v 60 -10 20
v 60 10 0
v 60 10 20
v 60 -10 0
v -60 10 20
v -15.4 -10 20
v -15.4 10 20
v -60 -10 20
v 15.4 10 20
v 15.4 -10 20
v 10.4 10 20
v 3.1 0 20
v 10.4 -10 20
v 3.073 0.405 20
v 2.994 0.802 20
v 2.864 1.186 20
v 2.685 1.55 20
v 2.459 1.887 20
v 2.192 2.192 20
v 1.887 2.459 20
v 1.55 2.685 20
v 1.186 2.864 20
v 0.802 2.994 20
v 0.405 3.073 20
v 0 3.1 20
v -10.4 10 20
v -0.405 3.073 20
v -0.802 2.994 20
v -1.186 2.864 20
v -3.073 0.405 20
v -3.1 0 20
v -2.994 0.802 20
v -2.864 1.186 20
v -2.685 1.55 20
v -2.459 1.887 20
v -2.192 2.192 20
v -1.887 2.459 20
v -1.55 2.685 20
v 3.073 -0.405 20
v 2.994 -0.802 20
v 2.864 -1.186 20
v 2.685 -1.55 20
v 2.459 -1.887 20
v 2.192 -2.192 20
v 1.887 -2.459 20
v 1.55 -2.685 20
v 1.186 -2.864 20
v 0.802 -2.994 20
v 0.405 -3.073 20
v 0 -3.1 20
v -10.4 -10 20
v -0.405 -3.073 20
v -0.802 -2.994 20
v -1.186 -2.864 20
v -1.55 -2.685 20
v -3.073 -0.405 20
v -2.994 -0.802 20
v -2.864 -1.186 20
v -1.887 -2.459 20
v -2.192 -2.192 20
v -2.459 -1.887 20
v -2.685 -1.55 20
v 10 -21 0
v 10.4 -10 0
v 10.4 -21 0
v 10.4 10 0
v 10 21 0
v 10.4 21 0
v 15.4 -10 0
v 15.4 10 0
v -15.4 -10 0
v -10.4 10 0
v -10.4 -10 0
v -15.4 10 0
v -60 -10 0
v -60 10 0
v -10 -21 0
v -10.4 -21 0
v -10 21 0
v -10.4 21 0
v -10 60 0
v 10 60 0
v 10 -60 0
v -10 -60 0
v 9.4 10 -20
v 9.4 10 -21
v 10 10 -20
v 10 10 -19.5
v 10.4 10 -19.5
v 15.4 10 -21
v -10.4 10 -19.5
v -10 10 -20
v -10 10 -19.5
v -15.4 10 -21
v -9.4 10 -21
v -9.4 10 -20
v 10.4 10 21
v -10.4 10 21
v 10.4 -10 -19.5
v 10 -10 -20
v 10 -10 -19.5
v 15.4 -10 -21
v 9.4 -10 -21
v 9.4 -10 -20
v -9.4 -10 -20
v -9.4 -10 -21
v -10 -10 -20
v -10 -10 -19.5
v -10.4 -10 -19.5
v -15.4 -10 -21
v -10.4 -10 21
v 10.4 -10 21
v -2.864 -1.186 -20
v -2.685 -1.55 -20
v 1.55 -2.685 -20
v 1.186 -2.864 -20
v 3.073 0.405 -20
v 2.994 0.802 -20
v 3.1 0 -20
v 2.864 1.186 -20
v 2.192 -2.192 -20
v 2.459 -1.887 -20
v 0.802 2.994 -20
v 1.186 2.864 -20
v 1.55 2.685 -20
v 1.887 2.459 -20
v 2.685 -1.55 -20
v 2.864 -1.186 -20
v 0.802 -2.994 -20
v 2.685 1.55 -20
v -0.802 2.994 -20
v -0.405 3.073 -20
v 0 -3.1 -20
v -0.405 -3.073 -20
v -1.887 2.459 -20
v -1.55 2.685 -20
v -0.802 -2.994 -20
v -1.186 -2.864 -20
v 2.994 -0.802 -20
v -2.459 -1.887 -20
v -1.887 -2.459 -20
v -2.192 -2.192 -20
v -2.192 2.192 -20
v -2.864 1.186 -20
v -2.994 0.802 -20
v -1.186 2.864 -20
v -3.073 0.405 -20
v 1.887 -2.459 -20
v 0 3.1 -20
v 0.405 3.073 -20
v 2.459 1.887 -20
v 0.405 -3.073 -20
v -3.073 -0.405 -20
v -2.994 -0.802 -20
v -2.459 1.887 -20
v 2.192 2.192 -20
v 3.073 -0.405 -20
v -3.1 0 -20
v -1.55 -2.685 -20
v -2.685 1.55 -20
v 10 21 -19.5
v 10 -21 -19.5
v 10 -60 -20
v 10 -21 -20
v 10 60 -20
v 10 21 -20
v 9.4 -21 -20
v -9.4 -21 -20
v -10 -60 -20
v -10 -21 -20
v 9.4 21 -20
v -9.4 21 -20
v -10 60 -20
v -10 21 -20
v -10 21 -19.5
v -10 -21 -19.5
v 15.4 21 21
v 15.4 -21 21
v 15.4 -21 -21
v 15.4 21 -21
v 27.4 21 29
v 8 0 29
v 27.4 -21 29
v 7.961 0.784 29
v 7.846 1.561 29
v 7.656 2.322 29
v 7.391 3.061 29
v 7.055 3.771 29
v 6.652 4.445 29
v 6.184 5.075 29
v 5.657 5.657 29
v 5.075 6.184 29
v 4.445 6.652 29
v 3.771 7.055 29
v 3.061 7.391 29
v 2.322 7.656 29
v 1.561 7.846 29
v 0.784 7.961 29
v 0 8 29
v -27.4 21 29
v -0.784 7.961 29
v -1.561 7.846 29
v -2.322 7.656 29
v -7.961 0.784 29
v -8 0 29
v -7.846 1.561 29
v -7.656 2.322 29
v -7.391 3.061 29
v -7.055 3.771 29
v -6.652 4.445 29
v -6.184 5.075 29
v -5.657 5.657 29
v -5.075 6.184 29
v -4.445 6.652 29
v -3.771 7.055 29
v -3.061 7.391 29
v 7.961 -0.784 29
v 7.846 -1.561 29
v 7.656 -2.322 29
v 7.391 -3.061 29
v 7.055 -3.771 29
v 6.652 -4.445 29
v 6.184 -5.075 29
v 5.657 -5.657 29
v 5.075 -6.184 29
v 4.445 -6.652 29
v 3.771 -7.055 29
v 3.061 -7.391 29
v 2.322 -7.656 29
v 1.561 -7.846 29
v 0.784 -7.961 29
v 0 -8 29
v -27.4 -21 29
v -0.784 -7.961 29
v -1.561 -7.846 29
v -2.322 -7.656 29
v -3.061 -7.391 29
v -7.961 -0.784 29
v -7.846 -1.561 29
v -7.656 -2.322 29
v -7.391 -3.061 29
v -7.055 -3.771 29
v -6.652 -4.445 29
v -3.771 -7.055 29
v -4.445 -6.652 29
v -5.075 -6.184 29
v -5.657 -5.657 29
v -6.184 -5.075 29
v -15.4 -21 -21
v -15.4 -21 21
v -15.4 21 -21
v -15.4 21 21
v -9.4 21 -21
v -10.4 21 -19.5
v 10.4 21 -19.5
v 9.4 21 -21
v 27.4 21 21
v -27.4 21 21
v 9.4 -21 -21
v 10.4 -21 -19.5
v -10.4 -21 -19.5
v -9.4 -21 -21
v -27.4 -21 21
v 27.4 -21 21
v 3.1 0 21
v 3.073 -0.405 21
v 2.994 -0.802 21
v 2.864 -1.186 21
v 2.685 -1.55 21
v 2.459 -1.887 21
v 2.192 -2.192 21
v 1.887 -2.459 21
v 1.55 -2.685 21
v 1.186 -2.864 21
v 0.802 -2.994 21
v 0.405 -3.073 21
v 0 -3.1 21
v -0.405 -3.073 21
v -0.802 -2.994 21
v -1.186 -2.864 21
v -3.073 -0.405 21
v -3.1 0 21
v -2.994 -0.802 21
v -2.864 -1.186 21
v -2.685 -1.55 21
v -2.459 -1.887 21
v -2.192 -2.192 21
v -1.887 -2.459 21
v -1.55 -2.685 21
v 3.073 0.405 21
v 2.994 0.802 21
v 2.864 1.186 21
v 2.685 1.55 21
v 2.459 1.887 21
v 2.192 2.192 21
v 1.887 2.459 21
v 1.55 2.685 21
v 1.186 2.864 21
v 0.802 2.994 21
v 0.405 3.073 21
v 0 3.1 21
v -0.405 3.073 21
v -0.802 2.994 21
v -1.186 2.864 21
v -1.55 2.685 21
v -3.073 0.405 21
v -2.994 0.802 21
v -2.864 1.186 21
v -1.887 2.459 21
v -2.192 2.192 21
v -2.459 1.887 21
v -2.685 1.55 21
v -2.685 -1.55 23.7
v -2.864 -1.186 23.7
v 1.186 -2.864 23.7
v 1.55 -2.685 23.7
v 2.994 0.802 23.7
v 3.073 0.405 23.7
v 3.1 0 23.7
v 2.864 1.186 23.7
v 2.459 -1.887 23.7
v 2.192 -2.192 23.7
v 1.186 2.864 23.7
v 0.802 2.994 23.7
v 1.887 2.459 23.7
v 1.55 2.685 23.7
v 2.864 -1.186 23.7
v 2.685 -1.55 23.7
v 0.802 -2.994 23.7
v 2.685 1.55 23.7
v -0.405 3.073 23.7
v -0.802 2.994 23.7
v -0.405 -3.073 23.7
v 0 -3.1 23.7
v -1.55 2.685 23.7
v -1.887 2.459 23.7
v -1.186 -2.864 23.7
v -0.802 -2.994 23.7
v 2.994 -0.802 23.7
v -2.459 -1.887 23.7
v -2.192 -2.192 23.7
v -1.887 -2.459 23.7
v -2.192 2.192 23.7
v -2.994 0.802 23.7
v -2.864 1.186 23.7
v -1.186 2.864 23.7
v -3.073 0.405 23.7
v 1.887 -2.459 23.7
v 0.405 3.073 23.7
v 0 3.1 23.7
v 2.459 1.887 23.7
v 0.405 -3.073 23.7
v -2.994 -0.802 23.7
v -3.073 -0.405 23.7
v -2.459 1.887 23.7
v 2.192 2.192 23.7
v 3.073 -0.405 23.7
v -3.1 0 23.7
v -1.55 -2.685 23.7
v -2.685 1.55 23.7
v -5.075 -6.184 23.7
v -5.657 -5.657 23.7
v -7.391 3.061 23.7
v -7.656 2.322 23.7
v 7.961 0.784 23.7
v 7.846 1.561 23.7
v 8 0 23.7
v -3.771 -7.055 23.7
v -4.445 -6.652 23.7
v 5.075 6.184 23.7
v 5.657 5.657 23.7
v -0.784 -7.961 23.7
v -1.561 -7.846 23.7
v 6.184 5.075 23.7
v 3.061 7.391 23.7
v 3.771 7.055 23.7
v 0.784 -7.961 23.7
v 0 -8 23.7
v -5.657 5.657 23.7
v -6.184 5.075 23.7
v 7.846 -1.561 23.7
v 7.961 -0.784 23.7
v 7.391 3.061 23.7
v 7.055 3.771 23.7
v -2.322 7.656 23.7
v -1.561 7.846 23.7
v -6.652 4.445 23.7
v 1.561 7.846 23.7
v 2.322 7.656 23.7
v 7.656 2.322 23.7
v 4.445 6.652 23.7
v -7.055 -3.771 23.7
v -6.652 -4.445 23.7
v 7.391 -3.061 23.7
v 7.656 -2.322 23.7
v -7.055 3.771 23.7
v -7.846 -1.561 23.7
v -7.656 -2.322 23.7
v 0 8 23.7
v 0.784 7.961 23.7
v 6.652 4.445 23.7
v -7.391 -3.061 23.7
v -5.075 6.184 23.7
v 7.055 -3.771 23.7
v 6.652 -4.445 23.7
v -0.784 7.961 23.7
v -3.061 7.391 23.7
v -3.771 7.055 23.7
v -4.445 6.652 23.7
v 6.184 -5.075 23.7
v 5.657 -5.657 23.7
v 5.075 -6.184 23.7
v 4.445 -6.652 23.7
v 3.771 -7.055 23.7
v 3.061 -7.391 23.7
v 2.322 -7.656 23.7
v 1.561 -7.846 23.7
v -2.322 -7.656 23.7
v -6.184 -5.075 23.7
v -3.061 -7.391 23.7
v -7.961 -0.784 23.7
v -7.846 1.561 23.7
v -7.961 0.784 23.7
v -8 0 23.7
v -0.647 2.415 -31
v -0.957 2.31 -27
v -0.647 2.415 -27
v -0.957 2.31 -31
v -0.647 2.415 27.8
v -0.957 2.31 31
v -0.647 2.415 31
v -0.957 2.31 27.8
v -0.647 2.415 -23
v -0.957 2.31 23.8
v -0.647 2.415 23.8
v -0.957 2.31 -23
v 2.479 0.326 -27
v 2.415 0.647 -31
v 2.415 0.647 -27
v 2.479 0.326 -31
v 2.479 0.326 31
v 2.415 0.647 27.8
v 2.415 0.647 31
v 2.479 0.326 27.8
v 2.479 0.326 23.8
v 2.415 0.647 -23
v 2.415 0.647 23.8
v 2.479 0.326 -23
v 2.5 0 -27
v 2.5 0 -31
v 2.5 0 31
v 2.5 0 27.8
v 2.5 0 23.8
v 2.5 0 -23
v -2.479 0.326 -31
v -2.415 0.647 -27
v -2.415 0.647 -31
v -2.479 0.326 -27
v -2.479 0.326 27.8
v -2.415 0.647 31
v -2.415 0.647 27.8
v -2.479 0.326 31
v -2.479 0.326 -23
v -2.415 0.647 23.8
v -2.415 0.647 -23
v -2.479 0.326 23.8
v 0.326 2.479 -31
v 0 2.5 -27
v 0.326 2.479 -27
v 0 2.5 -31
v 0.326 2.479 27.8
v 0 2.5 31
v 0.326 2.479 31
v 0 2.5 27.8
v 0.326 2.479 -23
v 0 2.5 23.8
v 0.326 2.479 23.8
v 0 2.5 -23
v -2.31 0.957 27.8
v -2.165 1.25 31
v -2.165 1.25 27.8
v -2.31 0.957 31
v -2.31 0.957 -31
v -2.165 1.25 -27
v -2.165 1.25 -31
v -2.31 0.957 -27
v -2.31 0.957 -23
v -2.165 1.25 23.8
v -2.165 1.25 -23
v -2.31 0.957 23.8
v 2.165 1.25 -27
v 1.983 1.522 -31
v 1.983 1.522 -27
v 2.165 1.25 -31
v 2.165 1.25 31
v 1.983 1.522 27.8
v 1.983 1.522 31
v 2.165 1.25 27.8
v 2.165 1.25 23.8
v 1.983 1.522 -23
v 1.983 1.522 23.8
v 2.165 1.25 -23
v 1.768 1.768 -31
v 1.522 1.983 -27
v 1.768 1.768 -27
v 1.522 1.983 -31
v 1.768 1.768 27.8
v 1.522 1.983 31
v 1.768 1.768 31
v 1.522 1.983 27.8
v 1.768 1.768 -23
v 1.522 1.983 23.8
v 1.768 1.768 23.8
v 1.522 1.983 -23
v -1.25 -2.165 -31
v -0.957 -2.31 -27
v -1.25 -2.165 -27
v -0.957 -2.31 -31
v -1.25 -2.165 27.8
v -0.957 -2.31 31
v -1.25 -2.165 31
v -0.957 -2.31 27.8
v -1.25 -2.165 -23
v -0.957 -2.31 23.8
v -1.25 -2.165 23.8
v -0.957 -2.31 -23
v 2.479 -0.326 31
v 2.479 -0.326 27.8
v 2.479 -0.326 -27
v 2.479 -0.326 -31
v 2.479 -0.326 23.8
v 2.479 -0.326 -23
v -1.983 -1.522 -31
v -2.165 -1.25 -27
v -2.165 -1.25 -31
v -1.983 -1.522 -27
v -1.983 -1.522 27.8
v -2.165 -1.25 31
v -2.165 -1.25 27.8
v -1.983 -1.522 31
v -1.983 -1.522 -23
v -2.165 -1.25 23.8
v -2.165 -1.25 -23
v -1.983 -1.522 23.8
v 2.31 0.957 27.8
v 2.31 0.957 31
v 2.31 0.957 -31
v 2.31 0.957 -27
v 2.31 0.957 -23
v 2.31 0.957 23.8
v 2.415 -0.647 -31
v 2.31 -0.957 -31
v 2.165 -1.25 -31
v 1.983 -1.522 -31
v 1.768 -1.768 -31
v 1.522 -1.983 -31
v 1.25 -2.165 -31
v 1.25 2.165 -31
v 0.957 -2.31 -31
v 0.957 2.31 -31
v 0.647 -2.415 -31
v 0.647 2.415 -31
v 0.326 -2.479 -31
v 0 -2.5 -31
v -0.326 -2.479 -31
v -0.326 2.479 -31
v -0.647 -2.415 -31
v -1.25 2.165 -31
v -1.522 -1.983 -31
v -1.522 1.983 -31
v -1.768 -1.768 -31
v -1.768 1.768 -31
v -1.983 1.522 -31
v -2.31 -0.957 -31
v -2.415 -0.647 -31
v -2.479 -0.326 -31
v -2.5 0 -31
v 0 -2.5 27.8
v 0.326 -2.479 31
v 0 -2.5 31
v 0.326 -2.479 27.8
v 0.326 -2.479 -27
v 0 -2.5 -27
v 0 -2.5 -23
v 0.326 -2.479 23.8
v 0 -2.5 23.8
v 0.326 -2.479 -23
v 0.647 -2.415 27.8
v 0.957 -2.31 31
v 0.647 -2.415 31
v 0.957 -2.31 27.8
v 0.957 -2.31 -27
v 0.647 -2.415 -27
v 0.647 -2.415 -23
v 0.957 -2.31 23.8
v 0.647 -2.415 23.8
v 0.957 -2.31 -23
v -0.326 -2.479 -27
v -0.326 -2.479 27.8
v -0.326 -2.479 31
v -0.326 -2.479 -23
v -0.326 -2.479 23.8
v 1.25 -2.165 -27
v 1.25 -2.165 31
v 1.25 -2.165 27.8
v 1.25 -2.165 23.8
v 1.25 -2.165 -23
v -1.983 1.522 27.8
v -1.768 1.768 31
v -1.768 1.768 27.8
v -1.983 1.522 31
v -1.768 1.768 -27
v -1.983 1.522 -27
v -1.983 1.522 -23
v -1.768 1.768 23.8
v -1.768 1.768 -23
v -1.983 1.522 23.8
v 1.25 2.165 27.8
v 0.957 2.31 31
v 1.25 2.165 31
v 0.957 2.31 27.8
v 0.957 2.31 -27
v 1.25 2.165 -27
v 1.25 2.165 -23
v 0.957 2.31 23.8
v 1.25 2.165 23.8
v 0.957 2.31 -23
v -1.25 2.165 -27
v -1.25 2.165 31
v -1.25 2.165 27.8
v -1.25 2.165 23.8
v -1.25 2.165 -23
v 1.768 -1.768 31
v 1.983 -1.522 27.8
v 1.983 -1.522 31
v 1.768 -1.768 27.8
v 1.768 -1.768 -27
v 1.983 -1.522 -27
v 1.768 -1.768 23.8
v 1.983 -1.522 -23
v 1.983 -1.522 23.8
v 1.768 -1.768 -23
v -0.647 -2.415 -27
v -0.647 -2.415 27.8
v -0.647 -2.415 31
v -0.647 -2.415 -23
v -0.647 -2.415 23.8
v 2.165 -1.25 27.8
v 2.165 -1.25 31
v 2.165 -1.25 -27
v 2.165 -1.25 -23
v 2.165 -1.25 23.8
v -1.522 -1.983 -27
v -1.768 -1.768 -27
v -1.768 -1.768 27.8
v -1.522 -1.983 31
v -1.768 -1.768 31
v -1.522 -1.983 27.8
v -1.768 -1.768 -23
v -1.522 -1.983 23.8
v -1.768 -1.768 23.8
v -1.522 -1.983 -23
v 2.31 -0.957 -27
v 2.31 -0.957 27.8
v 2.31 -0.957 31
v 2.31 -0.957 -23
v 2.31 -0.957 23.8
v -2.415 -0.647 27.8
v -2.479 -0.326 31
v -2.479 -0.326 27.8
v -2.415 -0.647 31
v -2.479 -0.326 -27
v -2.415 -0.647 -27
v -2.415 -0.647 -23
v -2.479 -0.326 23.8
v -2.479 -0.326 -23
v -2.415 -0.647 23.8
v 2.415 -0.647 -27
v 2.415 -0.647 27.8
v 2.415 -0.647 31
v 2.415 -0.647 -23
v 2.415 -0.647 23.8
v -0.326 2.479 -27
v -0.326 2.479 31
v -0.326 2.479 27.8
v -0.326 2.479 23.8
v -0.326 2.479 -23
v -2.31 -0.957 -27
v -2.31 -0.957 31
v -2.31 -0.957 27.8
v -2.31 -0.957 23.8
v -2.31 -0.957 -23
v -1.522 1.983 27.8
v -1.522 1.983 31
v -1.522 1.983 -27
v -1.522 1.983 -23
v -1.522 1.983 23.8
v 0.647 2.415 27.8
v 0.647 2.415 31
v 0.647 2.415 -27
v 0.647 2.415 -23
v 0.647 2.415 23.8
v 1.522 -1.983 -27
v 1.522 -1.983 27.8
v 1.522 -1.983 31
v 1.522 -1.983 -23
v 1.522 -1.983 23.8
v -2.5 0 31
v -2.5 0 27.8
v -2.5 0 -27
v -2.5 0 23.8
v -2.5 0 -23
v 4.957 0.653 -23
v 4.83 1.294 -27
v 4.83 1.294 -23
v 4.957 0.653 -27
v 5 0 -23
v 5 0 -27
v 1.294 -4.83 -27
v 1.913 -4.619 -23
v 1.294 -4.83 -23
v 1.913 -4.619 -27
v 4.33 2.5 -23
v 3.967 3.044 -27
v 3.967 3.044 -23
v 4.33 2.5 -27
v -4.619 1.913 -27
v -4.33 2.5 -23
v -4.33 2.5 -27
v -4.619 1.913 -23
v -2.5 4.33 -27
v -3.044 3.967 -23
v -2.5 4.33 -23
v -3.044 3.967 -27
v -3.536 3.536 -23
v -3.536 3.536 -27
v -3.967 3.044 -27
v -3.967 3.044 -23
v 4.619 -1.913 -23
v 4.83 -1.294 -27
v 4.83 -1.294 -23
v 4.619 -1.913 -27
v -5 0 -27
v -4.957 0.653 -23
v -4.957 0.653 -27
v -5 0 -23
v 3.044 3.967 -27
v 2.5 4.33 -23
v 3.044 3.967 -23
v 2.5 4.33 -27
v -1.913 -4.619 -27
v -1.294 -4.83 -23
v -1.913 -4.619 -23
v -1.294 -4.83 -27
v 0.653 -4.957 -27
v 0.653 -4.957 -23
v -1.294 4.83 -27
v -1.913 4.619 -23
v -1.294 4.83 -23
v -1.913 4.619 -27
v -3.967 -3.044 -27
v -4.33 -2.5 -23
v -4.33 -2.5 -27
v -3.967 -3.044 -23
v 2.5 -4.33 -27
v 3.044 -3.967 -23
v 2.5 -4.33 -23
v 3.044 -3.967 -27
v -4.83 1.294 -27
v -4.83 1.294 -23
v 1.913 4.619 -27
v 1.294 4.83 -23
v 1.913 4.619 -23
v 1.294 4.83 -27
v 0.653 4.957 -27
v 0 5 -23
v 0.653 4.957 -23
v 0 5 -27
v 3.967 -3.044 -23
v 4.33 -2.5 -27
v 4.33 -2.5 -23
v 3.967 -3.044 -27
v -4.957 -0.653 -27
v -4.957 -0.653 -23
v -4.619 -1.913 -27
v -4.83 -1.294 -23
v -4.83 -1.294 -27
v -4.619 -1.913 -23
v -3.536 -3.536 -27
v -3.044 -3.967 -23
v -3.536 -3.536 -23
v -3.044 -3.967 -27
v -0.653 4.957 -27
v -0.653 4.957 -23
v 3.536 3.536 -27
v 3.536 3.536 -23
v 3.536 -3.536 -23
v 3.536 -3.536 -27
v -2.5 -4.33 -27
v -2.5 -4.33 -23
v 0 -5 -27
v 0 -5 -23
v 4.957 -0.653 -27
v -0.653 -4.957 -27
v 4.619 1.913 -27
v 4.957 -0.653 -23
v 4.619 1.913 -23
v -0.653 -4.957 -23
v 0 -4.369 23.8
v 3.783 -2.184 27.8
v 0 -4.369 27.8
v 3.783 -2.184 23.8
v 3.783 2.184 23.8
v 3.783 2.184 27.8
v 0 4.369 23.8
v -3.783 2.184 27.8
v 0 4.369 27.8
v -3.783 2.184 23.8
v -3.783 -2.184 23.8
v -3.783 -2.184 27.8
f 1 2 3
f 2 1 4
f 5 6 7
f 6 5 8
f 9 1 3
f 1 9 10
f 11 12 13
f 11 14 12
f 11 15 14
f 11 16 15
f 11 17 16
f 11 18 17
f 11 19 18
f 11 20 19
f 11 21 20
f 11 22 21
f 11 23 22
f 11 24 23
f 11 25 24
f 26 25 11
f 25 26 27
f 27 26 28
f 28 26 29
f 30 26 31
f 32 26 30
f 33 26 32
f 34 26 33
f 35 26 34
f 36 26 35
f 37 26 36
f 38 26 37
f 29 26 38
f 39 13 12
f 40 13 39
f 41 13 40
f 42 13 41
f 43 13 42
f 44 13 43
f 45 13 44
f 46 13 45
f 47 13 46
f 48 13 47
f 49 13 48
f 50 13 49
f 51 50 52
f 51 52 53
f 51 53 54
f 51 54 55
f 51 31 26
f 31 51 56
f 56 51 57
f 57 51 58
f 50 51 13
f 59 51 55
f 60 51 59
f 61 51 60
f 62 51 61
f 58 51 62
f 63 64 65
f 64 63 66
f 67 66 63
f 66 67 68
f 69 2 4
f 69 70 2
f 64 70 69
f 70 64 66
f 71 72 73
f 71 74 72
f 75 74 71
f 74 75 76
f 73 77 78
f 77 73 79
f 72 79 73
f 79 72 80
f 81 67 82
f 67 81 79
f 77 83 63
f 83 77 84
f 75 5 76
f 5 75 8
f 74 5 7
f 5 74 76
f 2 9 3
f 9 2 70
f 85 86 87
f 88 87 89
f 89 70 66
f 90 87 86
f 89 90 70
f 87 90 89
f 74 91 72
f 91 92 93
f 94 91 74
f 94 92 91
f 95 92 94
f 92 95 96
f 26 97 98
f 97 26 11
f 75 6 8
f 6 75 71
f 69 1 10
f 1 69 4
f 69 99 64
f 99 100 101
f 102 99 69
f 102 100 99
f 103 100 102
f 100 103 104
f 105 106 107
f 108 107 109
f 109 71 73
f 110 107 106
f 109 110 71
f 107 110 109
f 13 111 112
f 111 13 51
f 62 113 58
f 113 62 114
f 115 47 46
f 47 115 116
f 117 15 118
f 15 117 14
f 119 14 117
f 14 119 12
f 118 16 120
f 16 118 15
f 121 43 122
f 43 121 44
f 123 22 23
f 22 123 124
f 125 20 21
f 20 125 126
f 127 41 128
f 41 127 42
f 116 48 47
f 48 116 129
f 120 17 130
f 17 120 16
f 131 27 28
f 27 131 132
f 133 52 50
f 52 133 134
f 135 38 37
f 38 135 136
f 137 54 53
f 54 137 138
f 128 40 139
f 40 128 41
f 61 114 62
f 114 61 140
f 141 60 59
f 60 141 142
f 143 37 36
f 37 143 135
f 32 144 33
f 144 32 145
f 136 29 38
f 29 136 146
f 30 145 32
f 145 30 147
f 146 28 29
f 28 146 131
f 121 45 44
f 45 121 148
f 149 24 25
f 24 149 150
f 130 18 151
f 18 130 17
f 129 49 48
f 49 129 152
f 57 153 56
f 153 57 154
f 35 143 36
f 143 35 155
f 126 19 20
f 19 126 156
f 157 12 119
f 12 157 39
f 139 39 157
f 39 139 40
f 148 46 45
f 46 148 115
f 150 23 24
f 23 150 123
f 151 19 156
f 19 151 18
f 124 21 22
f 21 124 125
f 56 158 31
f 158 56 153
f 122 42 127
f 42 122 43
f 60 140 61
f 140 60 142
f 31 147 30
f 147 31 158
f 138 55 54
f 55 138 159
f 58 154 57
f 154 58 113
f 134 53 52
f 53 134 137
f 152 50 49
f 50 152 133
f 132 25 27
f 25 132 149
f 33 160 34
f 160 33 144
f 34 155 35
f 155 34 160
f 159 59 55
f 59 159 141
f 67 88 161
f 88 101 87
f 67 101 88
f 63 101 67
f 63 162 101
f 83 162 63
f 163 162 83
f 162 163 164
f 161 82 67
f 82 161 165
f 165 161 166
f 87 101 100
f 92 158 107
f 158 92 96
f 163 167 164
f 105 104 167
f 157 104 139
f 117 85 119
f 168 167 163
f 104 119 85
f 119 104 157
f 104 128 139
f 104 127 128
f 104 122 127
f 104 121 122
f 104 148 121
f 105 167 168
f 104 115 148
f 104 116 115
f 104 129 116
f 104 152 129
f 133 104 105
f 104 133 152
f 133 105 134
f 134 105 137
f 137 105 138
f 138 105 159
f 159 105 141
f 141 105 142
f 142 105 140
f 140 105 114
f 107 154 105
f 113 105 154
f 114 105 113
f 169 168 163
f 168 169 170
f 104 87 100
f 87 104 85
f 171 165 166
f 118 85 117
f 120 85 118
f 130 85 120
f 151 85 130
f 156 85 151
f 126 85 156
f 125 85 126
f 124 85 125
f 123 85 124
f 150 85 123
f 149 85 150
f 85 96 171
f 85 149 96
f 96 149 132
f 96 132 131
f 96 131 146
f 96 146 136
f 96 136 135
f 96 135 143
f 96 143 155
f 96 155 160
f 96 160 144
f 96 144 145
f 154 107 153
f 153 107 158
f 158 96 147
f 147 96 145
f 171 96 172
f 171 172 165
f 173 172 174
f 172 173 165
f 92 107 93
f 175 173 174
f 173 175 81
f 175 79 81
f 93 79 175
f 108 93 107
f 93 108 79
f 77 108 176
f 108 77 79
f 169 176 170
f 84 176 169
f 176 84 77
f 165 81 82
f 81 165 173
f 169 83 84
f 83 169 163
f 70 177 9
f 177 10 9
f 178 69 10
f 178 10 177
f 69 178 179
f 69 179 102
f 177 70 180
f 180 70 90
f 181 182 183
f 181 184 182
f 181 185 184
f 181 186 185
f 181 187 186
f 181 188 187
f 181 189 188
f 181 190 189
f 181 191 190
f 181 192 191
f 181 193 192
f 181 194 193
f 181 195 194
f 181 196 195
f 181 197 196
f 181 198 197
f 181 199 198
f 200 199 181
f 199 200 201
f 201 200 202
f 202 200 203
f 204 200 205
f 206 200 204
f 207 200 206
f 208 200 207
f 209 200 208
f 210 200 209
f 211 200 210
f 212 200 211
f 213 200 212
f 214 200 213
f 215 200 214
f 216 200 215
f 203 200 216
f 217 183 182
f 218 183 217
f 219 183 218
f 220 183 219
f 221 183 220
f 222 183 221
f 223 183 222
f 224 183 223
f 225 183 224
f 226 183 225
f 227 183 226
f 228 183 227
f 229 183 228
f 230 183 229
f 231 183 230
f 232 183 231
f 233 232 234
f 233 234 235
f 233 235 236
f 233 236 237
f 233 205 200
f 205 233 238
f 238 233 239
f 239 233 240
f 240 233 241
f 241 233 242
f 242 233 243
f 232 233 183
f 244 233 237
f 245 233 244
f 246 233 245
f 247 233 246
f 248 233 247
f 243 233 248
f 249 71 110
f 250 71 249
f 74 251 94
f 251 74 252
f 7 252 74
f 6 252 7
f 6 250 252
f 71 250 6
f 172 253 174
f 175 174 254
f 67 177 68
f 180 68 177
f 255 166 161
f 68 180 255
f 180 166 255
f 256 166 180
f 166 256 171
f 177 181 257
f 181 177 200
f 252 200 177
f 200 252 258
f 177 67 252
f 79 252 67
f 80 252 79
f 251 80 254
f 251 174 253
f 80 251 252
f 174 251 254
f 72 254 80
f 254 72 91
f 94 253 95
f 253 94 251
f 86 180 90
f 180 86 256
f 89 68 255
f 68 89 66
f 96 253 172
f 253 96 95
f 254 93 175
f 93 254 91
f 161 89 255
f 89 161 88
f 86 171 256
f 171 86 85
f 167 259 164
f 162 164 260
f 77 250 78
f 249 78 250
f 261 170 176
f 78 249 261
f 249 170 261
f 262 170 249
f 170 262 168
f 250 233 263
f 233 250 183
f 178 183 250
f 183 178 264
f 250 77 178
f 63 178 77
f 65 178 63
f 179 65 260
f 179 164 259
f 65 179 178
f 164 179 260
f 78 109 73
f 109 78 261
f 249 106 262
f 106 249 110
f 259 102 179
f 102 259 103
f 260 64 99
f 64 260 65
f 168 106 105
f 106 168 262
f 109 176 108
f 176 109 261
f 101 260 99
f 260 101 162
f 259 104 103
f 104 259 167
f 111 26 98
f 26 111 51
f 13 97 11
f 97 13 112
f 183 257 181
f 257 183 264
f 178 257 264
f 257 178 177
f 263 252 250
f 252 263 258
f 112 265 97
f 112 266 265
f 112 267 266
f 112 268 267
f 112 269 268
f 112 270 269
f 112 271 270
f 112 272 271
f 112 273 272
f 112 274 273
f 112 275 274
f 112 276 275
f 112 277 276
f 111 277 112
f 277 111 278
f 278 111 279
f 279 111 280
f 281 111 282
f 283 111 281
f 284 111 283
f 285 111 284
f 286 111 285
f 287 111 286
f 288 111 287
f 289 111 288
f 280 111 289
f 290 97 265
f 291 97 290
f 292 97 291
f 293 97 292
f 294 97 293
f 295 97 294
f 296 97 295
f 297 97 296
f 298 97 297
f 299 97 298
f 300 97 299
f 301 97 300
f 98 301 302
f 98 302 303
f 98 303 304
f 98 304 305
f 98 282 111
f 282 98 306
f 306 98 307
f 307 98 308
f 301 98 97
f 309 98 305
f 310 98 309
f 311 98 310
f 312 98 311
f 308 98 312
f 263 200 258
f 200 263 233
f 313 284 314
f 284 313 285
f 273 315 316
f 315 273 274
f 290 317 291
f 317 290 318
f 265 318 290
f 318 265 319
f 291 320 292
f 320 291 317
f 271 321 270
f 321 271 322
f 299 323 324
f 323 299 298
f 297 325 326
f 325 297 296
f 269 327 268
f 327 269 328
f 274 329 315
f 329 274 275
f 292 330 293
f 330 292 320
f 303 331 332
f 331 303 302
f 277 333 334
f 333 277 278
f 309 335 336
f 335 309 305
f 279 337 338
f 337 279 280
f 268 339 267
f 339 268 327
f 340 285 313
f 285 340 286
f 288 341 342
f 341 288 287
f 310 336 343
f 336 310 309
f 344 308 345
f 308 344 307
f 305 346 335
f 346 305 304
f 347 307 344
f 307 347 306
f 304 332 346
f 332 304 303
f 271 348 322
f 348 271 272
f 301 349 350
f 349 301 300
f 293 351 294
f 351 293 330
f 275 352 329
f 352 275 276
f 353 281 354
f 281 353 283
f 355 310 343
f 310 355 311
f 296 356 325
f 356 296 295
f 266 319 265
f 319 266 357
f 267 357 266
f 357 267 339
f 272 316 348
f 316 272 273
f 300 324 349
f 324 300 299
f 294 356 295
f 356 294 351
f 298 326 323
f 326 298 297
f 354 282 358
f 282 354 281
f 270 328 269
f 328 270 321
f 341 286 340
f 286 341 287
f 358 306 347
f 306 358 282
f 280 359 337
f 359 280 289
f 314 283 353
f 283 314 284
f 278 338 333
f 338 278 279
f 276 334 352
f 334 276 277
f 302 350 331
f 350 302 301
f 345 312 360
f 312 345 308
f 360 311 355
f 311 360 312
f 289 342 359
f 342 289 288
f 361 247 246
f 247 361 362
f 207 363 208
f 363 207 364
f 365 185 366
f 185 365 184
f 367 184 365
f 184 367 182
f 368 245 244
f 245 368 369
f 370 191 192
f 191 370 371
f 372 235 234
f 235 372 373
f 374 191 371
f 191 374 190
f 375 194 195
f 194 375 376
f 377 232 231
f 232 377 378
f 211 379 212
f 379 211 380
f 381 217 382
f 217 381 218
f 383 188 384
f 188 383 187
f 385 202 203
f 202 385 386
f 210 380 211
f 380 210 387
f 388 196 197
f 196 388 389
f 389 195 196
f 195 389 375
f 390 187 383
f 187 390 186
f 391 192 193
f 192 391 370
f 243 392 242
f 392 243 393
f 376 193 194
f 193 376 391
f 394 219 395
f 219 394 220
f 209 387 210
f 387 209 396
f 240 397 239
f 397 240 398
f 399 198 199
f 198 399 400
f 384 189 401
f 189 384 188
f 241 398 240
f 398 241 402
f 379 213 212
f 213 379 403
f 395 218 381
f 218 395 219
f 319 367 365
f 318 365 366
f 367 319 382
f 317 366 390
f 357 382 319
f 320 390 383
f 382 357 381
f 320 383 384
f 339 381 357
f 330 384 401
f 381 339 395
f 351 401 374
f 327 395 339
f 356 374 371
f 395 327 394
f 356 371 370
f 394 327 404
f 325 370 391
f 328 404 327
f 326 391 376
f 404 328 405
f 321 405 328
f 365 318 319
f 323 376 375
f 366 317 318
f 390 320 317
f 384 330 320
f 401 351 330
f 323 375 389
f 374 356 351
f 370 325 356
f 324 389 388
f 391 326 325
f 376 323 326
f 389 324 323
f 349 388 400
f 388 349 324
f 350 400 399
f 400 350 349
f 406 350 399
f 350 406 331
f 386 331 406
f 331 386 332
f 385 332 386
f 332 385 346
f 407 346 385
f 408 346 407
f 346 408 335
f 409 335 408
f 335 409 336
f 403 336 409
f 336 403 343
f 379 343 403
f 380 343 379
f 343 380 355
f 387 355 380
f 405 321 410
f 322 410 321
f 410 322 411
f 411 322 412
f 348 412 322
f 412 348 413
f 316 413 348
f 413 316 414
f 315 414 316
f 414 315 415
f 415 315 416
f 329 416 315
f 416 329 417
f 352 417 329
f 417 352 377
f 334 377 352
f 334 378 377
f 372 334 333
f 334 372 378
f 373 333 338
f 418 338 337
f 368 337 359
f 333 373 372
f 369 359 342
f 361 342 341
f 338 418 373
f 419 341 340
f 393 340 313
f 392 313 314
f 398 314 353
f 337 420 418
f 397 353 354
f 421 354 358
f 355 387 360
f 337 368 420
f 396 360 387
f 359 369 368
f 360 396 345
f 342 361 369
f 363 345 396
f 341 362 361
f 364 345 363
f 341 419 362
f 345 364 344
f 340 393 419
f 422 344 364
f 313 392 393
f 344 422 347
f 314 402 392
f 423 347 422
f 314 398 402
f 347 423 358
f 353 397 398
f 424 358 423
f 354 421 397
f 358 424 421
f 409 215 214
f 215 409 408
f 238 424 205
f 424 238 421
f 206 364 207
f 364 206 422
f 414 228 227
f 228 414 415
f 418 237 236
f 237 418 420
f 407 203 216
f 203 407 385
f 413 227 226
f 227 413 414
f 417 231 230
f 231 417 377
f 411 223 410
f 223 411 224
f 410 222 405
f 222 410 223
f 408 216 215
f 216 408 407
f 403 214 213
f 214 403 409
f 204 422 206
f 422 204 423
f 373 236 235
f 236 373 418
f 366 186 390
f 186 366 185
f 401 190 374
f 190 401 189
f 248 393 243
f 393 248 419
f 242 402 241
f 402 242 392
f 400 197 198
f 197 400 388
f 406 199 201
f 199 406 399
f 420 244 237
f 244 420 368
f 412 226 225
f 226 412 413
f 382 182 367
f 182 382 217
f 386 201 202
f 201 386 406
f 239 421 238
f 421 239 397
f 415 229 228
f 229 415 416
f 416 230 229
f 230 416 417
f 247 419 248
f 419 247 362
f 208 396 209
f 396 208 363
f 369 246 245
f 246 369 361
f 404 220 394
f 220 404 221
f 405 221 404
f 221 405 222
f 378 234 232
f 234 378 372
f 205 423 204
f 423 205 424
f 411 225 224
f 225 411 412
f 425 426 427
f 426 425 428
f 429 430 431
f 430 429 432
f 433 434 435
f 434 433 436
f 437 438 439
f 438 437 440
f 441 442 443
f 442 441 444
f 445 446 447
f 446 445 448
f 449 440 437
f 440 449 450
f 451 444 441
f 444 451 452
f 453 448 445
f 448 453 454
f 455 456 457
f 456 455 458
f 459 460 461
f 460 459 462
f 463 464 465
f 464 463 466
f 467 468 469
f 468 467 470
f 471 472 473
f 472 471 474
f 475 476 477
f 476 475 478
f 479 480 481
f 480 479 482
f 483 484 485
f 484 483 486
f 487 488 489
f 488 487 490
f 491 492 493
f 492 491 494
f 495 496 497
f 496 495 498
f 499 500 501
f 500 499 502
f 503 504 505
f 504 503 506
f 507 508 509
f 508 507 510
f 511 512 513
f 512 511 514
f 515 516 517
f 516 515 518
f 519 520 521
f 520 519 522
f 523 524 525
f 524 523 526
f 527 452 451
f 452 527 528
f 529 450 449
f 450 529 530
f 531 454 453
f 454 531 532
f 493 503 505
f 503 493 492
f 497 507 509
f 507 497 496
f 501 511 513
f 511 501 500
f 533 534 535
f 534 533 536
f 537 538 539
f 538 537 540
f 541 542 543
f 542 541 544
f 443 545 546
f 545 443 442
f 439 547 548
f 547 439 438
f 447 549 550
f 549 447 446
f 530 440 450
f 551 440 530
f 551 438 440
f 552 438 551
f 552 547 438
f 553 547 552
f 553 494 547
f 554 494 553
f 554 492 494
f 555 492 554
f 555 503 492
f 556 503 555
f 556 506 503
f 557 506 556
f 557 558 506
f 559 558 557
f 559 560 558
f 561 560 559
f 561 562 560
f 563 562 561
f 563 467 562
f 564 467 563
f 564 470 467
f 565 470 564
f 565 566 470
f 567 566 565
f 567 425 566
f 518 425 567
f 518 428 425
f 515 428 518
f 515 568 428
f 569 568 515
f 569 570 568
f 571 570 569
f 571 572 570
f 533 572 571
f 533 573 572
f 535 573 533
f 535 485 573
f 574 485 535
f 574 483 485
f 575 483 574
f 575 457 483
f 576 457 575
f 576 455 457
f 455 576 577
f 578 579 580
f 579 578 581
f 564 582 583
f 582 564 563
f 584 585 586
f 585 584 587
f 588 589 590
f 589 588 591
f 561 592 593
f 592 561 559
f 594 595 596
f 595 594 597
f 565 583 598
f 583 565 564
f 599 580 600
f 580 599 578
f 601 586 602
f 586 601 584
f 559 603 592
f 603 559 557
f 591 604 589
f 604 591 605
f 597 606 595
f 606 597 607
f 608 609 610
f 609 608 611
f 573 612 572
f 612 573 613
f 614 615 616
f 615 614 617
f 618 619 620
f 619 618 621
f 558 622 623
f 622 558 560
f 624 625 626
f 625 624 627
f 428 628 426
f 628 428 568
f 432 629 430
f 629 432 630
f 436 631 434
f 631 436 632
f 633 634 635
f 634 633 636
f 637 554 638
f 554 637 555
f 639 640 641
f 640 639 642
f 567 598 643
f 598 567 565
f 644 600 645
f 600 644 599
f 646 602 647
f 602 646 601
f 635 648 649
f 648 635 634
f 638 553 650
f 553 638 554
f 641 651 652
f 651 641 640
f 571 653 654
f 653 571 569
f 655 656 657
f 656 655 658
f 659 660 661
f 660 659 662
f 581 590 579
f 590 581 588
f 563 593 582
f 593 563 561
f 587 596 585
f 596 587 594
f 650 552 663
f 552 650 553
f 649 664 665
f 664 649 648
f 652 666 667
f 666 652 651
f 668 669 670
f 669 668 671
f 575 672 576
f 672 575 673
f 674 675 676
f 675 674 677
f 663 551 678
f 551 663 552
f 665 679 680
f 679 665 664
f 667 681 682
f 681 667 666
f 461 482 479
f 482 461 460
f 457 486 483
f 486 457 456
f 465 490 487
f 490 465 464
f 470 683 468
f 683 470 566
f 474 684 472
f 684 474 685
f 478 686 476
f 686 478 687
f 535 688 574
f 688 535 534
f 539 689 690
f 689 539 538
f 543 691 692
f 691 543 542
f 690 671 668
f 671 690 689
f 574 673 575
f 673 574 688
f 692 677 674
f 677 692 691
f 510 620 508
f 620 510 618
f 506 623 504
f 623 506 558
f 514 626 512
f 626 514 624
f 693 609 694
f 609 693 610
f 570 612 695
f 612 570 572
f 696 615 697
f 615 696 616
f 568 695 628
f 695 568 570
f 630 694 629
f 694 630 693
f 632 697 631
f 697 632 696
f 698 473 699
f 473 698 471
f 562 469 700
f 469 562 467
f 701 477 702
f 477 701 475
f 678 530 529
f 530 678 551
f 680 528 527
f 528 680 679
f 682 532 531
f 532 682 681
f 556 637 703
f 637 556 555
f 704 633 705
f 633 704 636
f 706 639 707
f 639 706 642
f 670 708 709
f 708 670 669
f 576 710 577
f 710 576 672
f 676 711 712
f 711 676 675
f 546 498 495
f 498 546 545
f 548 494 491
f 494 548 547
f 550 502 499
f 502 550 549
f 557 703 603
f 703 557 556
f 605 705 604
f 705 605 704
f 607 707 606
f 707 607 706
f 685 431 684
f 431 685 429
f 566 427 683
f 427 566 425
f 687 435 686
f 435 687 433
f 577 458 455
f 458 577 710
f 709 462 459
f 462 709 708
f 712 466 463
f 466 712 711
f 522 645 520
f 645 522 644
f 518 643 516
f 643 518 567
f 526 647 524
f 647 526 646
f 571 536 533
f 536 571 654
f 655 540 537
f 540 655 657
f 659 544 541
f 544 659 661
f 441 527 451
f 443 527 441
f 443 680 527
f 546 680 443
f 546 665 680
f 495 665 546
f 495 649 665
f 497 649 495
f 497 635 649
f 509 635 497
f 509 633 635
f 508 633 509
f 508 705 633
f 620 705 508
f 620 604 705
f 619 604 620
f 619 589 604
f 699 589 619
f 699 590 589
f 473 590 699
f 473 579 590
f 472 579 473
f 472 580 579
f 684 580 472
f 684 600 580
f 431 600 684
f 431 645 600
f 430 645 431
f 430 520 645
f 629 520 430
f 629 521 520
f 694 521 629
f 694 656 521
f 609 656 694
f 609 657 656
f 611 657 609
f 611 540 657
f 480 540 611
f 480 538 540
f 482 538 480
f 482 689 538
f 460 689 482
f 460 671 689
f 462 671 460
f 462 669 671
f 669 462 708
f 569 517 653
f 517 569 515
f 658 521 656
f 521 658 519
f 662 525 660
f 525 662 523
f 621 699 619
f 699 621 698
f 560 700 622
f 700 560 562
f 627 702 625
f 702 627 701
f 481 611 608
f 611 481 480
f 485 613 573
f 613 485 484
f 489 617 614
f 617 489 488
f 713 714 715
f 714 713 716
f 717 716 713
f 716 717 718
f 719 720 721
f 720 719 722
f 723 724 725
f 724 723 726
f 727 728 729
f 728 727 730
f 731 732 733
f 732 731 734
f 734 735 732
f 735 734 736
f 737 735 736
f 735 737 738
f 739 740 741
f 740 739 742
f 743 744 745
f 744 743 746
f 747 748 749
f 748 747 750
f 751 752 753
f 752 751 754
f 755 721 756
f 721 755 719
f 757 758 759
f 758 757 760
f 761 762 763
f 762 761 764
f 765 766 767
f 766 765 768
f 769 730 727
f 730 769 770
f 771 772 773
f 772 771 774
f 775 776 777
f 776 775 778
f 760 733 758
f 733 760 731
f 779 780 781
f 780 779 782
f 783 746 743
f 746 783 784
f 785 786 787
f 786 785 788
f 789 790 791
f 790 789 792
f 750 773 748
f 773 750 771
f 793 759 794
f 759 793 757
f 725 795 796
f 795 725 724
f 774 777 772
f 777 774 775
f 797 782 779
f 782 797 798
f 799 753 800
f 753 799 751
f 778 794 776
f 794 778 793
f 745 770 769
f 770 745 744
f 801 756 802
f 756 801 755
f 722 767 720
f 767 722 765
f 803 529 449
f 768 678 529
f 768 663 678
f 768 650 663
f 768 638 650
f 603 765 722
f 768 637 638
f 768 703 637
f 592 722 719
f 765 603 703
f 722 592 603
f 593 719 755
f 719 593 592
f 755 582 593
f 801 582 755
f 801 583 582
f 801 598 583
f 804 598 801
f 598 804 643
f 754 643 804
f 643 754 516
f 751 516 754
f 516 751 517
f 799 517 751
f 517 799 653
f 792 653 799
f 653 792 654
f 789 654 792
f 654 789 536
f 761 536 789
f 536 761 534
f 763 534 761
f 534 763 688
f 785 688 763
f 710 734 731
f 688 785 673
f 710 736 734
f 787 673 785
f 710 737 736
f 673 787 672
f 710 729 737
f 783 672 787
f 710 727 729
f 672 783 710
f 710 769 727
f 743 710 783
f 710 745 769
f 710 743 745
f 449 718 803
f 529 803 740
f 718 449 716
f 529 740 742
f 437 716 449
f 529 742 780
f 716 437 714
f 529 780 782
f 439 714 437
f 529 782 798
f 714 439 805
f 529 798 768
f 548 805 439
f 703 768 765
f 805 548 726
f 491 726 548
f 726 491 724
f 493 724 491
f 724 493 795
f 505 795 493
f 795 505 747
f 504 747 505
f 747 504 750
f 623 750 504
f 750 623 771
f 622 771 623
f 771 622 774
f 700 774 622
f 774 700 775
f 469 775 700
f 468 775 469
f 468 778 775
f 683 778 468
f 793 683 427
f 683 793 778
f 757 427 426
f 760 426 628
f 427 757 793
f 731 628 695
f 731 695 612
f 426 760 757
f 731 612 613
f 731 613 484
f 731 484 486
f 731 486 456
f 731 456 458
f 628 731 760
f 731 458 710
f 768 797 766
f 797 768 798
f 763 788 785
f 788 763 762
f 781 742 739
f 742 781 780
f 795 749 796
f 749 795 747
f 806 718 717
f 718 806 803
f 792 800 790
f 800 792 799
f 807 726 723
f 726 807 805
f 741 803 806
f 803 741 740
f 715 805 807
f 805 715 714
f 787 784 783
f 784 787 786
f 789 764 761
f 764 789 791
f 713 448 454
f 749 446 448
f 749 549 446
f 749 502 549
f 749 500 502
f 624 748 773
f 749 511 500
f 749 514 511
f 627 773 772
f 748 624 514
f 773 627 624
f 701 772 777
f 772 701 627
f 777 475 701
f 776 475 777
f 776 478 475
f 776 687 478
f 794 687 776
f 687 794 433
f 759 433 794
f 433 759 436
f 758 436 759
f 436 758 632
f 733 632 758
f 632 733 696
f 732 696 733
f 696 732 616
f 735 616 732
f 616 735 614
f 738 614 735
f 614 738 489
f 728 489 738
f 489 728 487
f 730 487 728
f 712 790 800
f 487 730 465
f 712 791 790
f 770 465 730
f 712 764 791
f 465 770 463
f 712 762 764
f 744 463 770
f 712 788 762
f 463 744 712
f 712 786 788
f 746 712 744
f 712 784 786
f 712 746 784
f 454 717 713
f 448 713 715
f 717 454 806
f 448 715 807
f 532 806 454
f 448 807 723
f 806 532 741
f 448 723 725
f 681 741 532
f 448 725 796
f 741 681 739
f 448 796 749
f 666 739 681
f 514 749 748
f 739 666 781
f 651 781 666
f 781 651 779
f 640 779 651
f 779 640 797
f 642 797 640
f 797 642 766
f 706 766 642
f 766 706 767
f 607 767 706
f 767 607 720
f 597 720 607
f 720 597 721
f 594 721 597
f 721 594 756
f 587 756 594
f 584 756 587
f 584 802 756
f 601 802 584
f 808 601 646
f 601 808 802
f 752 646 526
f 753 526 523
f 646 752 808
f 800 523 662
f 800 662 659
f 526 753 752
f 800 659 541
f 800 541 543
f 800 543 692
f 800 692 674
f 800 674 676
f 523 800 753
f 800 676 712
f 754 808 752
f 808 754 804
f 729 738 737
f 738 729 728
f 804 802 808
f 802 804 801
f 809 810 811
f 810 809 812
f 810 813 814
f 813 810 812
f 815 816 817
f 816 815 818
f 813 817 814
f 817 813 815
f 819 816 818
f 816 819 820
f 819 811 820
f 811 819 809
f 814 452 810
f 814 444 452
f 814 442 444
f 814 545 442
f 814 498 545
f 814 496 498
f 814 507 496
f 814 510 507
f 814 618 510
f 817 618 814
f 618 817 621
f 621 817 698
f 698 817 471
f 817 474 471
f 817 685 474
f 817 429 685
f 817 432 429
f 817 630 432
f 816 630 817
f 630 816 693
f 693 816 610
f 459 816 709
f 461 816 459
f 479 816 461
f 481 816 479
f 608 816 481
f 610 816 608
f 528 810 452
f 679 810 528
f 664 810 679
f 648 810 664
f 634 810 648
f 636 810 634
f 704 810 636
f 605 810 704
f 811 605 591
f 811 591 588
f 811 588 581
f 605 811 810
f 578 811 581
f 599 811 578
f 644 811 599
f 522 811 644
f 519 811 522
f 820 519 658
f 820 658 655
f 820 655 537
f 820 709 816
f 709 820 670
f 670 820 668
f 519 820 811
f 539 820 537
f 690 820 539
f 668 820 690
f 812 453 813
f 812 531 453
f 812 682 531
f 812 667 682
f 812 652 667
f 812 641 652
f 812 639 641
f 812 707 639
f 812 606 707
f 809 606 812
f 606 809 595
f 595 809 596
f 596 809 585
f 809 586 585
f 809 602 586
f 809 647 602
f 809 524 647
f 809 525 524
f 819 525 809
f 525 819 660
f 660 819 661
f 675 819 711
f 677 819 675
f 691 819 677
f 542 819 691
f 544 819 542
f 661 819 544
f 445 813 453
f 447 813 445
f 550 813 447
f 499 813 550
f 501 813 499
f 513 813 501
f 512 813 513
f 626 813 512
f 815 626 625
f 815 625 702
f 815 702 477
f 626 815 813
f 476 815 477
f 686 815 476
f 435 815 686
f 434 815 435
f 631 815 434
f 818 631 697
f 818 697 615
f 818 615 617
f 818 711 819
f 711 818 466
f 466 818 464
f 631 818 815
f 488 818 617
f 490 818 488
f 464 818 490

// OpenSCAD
// Pingpang-SmartGear — one-piece double-U joint guard, v0.7
//
// Mechanical contract for this correction:
//   x = barrier long direction
//   y = front/back direction
//   z = vertical direction
//
// The printed part is ONE solid.  It contains a front U and a back U, joined
// by one printed top yoke.  The clear distance between the two U inner faces
// is exactly 20 mm.  There is no male/female printed connection and no second
// printed part to bolt together.
//
// The context tubes are the local joint envelope:
//   upper long 20x20 tube: axis x, z=0..20
//   lower perpendicular 20x20 tube: axis y, z=-20..0
// They touch at z=0 and share a vertical screw axis through their centre.

$fn = 48;

PART = "assembly_iso";

// ---------- fixed interface dimensions ----------
tube = 20;
u_inner_distance_y = 20;       // hard requirement: inner face to inner face
u_clearance_x = 0.8;           // only the x direction has initial PETG relief
u_inner_width_x = tube + u_clearance_x;
wall = 5.0;
u_outer_width_x = u_inner_width_x + 2 * wall;

front_y_inner = u_inner_distance_y / 2;
base_plate_depth_y = 7.0;
front_back_extension_y = 4.0;  // extend the complete U plate front-to-back
plate_depth_y = base_plate_depth_y + front_back_extension_y;
front_y_outer = front_y_inner + plate_depth_y;
back_y_outer = -front_y_outer;
back_y_inner = -front_y_inner;

foot_bottom_z = -tube;
below_foot_extension_z = 1.0;
u_bottom = foot_bottom_z - below_foot_extension_z;
top_yoke_bottom_z = 21.0;       // 1 mm above the upper 20x20 tube top
top_yoke_thickness = 8.0;       // reinforced top connection beam
u_top = top_yoke_bottom_z + top_yoke_thickness;
roof_eave_extension_x = 12.0;   // roof overhang on each +X/-X side
roof_width_x = u_outer_width_x + 2 * roof_eave_extension_x;
hook_depth_x = 3.5; // thinner inward wrap; keep the 8 mm vertical hold
hook_height_z = 1.5; // retain only a thin 1-2 mm vertical inward lip
solid_upper_wall_bottom_z = 0.0; // upper wall/web ends at the foot's upper edge

// Preview-only context: show the complete lower foot rather than a clipped
// 20 mm joint slice.  This does not change the printable part.
preview_foot_length_y = 120.0;

// Vertical screw relief.  This is a clearance hole, never a printed thread;
// the actual M4/M5 screw and nut/tapped tube remain external hardware.
screw_clearance_d = 6.2;

// Full top nut envelope.  Use a round pocket so a hex nut can enter in any
// rotational orientation; the clearance is intentionally generous.
nut_pocket_d = 16.0;
nut_pocket_depth = 5.2;
nut_height = 4.0;
preview_nut_af = 8.0;

assert(u_inner_distance_y == 20, "双 U 内距离必须保持 20 mm");

// ---------- helpers ----------
module box_at(xc, yc, zc, sx, sy, sz) {
    translate([xc, yc, zc]) cube([sx, sy, sz], center = true);
}

module u_plate(y0, y1) {
    depth = y1 - y0;
    yc = (y0 + y1) / 2;
    left_x = -u_outer_width_x / 2 + wall / 2;
    right_x = u_outer_width_x / 2 - wall / 2;
    lip_z = u_bottom + hook_height_z / 2;
    left_lip_x = -u_outer_width_x / 2 + wall / 2 + hook_depth_x / 2;
    right_lip_x = u_outer_width_x / 2 - wall / 2 - hook_depth_x / 2;
    union() {
        // U top and two continuous arms.
        box_at(0, yc, u_top - top_yoke_thickness / 2,
               u_outer_width_x, depth, top_yoke_thickness);
        box_at(left_x, yc, (u_top + u_bottom) / 2,
               wall, depth, u_top - u_bottom);
        box_at(right_x, yc, (u_top + u_bottom) / 2,
               wall, depth, u_top - u_bottom);

        // Solid upper web in the XZ U: fill the former open area below the
        // beam down to the top of the blue lower tube (z=0).  The web exists
        // only in the front/back U plates, so the lower foot still passes
        // through the 20 mm gap between them.
        box_at(0, yc,
               solid_upper_wall_bottom_z
                   + (u_top - solid_upper_wall_bottom_z) / 2,
               u_inner_width_x, depth,
               u_top - solid_upper_wall_bottom_z);

        // Inward lower hooks: the actual anti-rotation retaining feature.
        box_at(left_lip_x, yc, lip_z,
               hook_depth_x, depth, hook_height_z);
        box_at(right_lip_x, yc, lip_z,
               hook_depth_x, depth, hook_height_z);

    }
}

module printed_yokes() {
    // The top yoke joins the top bridges of both U plates into one roof.
    // It overhangs the U side walls by 12 mm on both sides along X.
    // The lower mouths remain open below z=0 so the front/back silhouettes
    // still retain the lower U feet and inward hooks.
    box_at(0, 0, u_top - top_yoke_thickness / 2,
           roof_width_x, 2 * front_y_outer, top_yoke_thickness);
}

module solid_upper_side_walls() {
    // Above the foot, the left and right sides are continuous solid walls
    // through the full front/back depth.  The front/back U plates also have
    // an upper web (inside u_plate) down to z=0.  The lower foot region remains
    // open except for the U arms and inward retaining hooks.
    left_x = -u_outer_width_x / 2 + wall / 2;
    right_x = u_outer_width_x / 2 - wall / 2;
    wall_height = u_top - solid_upper_wall_bottom_z;

    box_at(left_x, 0, solid_upper_wall_bottom_z + wall_height / 2,
           wall, 2 * front_y_outer, wall_height);
    box_at(right_x, 0, solid_upper_wall_bottom_z + wall_height / 2,
           wall, 2 * front_y_outer, wall_height);
}

module vertical_screw_relief() {
    // Full z-axis clearance through the printed top yoke.  There is no printed
    // material in the middle gap, so this does not create a hidden horizontal
    // tunnel or a self-intersecting connector.  The screw approaches from
    // below, passes through the two tube sections, and exits this top yoke.
    translate([0, 0, (u_bottom + u_top) / 2])
        cylinder(d = screw_clearance_d,
                 h = (u_top - u_bottom) + 8,
                 center = true);

    // Round pocket opens from the top face.  The remaining floor keeps the nut
    // captured while the round wall removes any rotational insertion constraint.
    translate([0, 0, u_top - nut_pocket_depth / 2])
        cylinder(d = nut_pocket_d,
                 h = nut_pocket_depth + 0.2,
                 center = true,
                 $fn = 64);
}

module double_u_clip() {
    difference() {
        union() {
            // Front U: inner face y=+10, outer face y=+21.
            u_plate(front_y_inner, front_y_outer);

            // Back U: inner face y=-10, outer face y=-21.
            u_plate(back_y_outer, back_y_inner);

            printed_yokes();
            solid_upper_side_walls();
        }
        vertical_screw_relief();
    }
}

// ---------- context envelope for preview only ----------
module vertical_bore() {
    translate([0, 0, 0])
        cylinder(d = screw_clearance_d, h = 60, center = true);
}

module upper_long_tube() {
    color([0.58, 0.61, 0.66])
        difference() {
            translate([0, 0, tube / 2])
                cube([120, tube, tube], center = true);
            vertical_bore();
        }
}

module lower_cross_tube() {
    // Preview the complete lower foot along y.  The printable interface still
    // uses the exact 20 mm gap between the two U inner faces.
    color([0.28, 0.45, 0.78])
        difference() {
            translate([0, 0, -tube / 2])
                cube([tube, preview_foot_length_y, tube], center = true);
            vertical_bore();
        }
}

module vertical_joint_screw() {
    color([0.82, 0.82, 0.84])
        translate([0, 0, 0])
            cylinder(d = 5.0, h = 62, center = true);

    // Screw head below the lower yoke.
    color([0.92, 0.70, 0.12])
        translate([0, 0, u_bottom - 4])
            cylinder(d = 10.0, h = 4.0, center = true);

    // The nut sits inside the recessed top pocket, below the top surface.
    color([0.92, 0.70, 0.12])
        translate([0, 0, u_top - nut_pocket_depth + nut_height / 2])
            rotate([0, 0, 30])
                cylinder(r = preview_nut_af / (2 * cos(30)) - 0.25,
                         h = nut_height,
                         center = true,
                         $fn = 6);
}

module assembly_iso() {
    upper_long_tube();
    lower_cross_tube();
    color([0.96, 0.39, 0.08]) double_u_clip();
    vertical_joint_screw();
}

module assembly_section() {
    // Cut the positive-x half to expose the vertical hole and the 20 mm gap.
    intersection() {
        assembly_iso();
        translate([0, -100, -100]) cube([100, 200, 200]);
    }
}

module clip_front() {
    double_u_clip();
}

module clip_bottom() {
    double_u_clip();
}

module clip_top() {
    double_u_clip();
}

module clip_print_orientation() {
    // One-piece print orientation.  The y envelope is placed on z=0.
    translate([0, 0, front_y_outer])
        rotate([90, 0, 0]) double_u_clip();
}

if (PART == "clip") {
    double_u_clip();
} else if (PART == "clip_print_orientation") {
    clip_print_orientation();
} else if (PART == "assembly_section") {
    assembly_section();
} else if (PART == "clip_front") {
    clip_front();
} else if (PART == "clip_bottom") {
    clip_bottom();
} else if (PART == "clip_top") {
    clip_top();
} else {
    assembly_iso();
}
